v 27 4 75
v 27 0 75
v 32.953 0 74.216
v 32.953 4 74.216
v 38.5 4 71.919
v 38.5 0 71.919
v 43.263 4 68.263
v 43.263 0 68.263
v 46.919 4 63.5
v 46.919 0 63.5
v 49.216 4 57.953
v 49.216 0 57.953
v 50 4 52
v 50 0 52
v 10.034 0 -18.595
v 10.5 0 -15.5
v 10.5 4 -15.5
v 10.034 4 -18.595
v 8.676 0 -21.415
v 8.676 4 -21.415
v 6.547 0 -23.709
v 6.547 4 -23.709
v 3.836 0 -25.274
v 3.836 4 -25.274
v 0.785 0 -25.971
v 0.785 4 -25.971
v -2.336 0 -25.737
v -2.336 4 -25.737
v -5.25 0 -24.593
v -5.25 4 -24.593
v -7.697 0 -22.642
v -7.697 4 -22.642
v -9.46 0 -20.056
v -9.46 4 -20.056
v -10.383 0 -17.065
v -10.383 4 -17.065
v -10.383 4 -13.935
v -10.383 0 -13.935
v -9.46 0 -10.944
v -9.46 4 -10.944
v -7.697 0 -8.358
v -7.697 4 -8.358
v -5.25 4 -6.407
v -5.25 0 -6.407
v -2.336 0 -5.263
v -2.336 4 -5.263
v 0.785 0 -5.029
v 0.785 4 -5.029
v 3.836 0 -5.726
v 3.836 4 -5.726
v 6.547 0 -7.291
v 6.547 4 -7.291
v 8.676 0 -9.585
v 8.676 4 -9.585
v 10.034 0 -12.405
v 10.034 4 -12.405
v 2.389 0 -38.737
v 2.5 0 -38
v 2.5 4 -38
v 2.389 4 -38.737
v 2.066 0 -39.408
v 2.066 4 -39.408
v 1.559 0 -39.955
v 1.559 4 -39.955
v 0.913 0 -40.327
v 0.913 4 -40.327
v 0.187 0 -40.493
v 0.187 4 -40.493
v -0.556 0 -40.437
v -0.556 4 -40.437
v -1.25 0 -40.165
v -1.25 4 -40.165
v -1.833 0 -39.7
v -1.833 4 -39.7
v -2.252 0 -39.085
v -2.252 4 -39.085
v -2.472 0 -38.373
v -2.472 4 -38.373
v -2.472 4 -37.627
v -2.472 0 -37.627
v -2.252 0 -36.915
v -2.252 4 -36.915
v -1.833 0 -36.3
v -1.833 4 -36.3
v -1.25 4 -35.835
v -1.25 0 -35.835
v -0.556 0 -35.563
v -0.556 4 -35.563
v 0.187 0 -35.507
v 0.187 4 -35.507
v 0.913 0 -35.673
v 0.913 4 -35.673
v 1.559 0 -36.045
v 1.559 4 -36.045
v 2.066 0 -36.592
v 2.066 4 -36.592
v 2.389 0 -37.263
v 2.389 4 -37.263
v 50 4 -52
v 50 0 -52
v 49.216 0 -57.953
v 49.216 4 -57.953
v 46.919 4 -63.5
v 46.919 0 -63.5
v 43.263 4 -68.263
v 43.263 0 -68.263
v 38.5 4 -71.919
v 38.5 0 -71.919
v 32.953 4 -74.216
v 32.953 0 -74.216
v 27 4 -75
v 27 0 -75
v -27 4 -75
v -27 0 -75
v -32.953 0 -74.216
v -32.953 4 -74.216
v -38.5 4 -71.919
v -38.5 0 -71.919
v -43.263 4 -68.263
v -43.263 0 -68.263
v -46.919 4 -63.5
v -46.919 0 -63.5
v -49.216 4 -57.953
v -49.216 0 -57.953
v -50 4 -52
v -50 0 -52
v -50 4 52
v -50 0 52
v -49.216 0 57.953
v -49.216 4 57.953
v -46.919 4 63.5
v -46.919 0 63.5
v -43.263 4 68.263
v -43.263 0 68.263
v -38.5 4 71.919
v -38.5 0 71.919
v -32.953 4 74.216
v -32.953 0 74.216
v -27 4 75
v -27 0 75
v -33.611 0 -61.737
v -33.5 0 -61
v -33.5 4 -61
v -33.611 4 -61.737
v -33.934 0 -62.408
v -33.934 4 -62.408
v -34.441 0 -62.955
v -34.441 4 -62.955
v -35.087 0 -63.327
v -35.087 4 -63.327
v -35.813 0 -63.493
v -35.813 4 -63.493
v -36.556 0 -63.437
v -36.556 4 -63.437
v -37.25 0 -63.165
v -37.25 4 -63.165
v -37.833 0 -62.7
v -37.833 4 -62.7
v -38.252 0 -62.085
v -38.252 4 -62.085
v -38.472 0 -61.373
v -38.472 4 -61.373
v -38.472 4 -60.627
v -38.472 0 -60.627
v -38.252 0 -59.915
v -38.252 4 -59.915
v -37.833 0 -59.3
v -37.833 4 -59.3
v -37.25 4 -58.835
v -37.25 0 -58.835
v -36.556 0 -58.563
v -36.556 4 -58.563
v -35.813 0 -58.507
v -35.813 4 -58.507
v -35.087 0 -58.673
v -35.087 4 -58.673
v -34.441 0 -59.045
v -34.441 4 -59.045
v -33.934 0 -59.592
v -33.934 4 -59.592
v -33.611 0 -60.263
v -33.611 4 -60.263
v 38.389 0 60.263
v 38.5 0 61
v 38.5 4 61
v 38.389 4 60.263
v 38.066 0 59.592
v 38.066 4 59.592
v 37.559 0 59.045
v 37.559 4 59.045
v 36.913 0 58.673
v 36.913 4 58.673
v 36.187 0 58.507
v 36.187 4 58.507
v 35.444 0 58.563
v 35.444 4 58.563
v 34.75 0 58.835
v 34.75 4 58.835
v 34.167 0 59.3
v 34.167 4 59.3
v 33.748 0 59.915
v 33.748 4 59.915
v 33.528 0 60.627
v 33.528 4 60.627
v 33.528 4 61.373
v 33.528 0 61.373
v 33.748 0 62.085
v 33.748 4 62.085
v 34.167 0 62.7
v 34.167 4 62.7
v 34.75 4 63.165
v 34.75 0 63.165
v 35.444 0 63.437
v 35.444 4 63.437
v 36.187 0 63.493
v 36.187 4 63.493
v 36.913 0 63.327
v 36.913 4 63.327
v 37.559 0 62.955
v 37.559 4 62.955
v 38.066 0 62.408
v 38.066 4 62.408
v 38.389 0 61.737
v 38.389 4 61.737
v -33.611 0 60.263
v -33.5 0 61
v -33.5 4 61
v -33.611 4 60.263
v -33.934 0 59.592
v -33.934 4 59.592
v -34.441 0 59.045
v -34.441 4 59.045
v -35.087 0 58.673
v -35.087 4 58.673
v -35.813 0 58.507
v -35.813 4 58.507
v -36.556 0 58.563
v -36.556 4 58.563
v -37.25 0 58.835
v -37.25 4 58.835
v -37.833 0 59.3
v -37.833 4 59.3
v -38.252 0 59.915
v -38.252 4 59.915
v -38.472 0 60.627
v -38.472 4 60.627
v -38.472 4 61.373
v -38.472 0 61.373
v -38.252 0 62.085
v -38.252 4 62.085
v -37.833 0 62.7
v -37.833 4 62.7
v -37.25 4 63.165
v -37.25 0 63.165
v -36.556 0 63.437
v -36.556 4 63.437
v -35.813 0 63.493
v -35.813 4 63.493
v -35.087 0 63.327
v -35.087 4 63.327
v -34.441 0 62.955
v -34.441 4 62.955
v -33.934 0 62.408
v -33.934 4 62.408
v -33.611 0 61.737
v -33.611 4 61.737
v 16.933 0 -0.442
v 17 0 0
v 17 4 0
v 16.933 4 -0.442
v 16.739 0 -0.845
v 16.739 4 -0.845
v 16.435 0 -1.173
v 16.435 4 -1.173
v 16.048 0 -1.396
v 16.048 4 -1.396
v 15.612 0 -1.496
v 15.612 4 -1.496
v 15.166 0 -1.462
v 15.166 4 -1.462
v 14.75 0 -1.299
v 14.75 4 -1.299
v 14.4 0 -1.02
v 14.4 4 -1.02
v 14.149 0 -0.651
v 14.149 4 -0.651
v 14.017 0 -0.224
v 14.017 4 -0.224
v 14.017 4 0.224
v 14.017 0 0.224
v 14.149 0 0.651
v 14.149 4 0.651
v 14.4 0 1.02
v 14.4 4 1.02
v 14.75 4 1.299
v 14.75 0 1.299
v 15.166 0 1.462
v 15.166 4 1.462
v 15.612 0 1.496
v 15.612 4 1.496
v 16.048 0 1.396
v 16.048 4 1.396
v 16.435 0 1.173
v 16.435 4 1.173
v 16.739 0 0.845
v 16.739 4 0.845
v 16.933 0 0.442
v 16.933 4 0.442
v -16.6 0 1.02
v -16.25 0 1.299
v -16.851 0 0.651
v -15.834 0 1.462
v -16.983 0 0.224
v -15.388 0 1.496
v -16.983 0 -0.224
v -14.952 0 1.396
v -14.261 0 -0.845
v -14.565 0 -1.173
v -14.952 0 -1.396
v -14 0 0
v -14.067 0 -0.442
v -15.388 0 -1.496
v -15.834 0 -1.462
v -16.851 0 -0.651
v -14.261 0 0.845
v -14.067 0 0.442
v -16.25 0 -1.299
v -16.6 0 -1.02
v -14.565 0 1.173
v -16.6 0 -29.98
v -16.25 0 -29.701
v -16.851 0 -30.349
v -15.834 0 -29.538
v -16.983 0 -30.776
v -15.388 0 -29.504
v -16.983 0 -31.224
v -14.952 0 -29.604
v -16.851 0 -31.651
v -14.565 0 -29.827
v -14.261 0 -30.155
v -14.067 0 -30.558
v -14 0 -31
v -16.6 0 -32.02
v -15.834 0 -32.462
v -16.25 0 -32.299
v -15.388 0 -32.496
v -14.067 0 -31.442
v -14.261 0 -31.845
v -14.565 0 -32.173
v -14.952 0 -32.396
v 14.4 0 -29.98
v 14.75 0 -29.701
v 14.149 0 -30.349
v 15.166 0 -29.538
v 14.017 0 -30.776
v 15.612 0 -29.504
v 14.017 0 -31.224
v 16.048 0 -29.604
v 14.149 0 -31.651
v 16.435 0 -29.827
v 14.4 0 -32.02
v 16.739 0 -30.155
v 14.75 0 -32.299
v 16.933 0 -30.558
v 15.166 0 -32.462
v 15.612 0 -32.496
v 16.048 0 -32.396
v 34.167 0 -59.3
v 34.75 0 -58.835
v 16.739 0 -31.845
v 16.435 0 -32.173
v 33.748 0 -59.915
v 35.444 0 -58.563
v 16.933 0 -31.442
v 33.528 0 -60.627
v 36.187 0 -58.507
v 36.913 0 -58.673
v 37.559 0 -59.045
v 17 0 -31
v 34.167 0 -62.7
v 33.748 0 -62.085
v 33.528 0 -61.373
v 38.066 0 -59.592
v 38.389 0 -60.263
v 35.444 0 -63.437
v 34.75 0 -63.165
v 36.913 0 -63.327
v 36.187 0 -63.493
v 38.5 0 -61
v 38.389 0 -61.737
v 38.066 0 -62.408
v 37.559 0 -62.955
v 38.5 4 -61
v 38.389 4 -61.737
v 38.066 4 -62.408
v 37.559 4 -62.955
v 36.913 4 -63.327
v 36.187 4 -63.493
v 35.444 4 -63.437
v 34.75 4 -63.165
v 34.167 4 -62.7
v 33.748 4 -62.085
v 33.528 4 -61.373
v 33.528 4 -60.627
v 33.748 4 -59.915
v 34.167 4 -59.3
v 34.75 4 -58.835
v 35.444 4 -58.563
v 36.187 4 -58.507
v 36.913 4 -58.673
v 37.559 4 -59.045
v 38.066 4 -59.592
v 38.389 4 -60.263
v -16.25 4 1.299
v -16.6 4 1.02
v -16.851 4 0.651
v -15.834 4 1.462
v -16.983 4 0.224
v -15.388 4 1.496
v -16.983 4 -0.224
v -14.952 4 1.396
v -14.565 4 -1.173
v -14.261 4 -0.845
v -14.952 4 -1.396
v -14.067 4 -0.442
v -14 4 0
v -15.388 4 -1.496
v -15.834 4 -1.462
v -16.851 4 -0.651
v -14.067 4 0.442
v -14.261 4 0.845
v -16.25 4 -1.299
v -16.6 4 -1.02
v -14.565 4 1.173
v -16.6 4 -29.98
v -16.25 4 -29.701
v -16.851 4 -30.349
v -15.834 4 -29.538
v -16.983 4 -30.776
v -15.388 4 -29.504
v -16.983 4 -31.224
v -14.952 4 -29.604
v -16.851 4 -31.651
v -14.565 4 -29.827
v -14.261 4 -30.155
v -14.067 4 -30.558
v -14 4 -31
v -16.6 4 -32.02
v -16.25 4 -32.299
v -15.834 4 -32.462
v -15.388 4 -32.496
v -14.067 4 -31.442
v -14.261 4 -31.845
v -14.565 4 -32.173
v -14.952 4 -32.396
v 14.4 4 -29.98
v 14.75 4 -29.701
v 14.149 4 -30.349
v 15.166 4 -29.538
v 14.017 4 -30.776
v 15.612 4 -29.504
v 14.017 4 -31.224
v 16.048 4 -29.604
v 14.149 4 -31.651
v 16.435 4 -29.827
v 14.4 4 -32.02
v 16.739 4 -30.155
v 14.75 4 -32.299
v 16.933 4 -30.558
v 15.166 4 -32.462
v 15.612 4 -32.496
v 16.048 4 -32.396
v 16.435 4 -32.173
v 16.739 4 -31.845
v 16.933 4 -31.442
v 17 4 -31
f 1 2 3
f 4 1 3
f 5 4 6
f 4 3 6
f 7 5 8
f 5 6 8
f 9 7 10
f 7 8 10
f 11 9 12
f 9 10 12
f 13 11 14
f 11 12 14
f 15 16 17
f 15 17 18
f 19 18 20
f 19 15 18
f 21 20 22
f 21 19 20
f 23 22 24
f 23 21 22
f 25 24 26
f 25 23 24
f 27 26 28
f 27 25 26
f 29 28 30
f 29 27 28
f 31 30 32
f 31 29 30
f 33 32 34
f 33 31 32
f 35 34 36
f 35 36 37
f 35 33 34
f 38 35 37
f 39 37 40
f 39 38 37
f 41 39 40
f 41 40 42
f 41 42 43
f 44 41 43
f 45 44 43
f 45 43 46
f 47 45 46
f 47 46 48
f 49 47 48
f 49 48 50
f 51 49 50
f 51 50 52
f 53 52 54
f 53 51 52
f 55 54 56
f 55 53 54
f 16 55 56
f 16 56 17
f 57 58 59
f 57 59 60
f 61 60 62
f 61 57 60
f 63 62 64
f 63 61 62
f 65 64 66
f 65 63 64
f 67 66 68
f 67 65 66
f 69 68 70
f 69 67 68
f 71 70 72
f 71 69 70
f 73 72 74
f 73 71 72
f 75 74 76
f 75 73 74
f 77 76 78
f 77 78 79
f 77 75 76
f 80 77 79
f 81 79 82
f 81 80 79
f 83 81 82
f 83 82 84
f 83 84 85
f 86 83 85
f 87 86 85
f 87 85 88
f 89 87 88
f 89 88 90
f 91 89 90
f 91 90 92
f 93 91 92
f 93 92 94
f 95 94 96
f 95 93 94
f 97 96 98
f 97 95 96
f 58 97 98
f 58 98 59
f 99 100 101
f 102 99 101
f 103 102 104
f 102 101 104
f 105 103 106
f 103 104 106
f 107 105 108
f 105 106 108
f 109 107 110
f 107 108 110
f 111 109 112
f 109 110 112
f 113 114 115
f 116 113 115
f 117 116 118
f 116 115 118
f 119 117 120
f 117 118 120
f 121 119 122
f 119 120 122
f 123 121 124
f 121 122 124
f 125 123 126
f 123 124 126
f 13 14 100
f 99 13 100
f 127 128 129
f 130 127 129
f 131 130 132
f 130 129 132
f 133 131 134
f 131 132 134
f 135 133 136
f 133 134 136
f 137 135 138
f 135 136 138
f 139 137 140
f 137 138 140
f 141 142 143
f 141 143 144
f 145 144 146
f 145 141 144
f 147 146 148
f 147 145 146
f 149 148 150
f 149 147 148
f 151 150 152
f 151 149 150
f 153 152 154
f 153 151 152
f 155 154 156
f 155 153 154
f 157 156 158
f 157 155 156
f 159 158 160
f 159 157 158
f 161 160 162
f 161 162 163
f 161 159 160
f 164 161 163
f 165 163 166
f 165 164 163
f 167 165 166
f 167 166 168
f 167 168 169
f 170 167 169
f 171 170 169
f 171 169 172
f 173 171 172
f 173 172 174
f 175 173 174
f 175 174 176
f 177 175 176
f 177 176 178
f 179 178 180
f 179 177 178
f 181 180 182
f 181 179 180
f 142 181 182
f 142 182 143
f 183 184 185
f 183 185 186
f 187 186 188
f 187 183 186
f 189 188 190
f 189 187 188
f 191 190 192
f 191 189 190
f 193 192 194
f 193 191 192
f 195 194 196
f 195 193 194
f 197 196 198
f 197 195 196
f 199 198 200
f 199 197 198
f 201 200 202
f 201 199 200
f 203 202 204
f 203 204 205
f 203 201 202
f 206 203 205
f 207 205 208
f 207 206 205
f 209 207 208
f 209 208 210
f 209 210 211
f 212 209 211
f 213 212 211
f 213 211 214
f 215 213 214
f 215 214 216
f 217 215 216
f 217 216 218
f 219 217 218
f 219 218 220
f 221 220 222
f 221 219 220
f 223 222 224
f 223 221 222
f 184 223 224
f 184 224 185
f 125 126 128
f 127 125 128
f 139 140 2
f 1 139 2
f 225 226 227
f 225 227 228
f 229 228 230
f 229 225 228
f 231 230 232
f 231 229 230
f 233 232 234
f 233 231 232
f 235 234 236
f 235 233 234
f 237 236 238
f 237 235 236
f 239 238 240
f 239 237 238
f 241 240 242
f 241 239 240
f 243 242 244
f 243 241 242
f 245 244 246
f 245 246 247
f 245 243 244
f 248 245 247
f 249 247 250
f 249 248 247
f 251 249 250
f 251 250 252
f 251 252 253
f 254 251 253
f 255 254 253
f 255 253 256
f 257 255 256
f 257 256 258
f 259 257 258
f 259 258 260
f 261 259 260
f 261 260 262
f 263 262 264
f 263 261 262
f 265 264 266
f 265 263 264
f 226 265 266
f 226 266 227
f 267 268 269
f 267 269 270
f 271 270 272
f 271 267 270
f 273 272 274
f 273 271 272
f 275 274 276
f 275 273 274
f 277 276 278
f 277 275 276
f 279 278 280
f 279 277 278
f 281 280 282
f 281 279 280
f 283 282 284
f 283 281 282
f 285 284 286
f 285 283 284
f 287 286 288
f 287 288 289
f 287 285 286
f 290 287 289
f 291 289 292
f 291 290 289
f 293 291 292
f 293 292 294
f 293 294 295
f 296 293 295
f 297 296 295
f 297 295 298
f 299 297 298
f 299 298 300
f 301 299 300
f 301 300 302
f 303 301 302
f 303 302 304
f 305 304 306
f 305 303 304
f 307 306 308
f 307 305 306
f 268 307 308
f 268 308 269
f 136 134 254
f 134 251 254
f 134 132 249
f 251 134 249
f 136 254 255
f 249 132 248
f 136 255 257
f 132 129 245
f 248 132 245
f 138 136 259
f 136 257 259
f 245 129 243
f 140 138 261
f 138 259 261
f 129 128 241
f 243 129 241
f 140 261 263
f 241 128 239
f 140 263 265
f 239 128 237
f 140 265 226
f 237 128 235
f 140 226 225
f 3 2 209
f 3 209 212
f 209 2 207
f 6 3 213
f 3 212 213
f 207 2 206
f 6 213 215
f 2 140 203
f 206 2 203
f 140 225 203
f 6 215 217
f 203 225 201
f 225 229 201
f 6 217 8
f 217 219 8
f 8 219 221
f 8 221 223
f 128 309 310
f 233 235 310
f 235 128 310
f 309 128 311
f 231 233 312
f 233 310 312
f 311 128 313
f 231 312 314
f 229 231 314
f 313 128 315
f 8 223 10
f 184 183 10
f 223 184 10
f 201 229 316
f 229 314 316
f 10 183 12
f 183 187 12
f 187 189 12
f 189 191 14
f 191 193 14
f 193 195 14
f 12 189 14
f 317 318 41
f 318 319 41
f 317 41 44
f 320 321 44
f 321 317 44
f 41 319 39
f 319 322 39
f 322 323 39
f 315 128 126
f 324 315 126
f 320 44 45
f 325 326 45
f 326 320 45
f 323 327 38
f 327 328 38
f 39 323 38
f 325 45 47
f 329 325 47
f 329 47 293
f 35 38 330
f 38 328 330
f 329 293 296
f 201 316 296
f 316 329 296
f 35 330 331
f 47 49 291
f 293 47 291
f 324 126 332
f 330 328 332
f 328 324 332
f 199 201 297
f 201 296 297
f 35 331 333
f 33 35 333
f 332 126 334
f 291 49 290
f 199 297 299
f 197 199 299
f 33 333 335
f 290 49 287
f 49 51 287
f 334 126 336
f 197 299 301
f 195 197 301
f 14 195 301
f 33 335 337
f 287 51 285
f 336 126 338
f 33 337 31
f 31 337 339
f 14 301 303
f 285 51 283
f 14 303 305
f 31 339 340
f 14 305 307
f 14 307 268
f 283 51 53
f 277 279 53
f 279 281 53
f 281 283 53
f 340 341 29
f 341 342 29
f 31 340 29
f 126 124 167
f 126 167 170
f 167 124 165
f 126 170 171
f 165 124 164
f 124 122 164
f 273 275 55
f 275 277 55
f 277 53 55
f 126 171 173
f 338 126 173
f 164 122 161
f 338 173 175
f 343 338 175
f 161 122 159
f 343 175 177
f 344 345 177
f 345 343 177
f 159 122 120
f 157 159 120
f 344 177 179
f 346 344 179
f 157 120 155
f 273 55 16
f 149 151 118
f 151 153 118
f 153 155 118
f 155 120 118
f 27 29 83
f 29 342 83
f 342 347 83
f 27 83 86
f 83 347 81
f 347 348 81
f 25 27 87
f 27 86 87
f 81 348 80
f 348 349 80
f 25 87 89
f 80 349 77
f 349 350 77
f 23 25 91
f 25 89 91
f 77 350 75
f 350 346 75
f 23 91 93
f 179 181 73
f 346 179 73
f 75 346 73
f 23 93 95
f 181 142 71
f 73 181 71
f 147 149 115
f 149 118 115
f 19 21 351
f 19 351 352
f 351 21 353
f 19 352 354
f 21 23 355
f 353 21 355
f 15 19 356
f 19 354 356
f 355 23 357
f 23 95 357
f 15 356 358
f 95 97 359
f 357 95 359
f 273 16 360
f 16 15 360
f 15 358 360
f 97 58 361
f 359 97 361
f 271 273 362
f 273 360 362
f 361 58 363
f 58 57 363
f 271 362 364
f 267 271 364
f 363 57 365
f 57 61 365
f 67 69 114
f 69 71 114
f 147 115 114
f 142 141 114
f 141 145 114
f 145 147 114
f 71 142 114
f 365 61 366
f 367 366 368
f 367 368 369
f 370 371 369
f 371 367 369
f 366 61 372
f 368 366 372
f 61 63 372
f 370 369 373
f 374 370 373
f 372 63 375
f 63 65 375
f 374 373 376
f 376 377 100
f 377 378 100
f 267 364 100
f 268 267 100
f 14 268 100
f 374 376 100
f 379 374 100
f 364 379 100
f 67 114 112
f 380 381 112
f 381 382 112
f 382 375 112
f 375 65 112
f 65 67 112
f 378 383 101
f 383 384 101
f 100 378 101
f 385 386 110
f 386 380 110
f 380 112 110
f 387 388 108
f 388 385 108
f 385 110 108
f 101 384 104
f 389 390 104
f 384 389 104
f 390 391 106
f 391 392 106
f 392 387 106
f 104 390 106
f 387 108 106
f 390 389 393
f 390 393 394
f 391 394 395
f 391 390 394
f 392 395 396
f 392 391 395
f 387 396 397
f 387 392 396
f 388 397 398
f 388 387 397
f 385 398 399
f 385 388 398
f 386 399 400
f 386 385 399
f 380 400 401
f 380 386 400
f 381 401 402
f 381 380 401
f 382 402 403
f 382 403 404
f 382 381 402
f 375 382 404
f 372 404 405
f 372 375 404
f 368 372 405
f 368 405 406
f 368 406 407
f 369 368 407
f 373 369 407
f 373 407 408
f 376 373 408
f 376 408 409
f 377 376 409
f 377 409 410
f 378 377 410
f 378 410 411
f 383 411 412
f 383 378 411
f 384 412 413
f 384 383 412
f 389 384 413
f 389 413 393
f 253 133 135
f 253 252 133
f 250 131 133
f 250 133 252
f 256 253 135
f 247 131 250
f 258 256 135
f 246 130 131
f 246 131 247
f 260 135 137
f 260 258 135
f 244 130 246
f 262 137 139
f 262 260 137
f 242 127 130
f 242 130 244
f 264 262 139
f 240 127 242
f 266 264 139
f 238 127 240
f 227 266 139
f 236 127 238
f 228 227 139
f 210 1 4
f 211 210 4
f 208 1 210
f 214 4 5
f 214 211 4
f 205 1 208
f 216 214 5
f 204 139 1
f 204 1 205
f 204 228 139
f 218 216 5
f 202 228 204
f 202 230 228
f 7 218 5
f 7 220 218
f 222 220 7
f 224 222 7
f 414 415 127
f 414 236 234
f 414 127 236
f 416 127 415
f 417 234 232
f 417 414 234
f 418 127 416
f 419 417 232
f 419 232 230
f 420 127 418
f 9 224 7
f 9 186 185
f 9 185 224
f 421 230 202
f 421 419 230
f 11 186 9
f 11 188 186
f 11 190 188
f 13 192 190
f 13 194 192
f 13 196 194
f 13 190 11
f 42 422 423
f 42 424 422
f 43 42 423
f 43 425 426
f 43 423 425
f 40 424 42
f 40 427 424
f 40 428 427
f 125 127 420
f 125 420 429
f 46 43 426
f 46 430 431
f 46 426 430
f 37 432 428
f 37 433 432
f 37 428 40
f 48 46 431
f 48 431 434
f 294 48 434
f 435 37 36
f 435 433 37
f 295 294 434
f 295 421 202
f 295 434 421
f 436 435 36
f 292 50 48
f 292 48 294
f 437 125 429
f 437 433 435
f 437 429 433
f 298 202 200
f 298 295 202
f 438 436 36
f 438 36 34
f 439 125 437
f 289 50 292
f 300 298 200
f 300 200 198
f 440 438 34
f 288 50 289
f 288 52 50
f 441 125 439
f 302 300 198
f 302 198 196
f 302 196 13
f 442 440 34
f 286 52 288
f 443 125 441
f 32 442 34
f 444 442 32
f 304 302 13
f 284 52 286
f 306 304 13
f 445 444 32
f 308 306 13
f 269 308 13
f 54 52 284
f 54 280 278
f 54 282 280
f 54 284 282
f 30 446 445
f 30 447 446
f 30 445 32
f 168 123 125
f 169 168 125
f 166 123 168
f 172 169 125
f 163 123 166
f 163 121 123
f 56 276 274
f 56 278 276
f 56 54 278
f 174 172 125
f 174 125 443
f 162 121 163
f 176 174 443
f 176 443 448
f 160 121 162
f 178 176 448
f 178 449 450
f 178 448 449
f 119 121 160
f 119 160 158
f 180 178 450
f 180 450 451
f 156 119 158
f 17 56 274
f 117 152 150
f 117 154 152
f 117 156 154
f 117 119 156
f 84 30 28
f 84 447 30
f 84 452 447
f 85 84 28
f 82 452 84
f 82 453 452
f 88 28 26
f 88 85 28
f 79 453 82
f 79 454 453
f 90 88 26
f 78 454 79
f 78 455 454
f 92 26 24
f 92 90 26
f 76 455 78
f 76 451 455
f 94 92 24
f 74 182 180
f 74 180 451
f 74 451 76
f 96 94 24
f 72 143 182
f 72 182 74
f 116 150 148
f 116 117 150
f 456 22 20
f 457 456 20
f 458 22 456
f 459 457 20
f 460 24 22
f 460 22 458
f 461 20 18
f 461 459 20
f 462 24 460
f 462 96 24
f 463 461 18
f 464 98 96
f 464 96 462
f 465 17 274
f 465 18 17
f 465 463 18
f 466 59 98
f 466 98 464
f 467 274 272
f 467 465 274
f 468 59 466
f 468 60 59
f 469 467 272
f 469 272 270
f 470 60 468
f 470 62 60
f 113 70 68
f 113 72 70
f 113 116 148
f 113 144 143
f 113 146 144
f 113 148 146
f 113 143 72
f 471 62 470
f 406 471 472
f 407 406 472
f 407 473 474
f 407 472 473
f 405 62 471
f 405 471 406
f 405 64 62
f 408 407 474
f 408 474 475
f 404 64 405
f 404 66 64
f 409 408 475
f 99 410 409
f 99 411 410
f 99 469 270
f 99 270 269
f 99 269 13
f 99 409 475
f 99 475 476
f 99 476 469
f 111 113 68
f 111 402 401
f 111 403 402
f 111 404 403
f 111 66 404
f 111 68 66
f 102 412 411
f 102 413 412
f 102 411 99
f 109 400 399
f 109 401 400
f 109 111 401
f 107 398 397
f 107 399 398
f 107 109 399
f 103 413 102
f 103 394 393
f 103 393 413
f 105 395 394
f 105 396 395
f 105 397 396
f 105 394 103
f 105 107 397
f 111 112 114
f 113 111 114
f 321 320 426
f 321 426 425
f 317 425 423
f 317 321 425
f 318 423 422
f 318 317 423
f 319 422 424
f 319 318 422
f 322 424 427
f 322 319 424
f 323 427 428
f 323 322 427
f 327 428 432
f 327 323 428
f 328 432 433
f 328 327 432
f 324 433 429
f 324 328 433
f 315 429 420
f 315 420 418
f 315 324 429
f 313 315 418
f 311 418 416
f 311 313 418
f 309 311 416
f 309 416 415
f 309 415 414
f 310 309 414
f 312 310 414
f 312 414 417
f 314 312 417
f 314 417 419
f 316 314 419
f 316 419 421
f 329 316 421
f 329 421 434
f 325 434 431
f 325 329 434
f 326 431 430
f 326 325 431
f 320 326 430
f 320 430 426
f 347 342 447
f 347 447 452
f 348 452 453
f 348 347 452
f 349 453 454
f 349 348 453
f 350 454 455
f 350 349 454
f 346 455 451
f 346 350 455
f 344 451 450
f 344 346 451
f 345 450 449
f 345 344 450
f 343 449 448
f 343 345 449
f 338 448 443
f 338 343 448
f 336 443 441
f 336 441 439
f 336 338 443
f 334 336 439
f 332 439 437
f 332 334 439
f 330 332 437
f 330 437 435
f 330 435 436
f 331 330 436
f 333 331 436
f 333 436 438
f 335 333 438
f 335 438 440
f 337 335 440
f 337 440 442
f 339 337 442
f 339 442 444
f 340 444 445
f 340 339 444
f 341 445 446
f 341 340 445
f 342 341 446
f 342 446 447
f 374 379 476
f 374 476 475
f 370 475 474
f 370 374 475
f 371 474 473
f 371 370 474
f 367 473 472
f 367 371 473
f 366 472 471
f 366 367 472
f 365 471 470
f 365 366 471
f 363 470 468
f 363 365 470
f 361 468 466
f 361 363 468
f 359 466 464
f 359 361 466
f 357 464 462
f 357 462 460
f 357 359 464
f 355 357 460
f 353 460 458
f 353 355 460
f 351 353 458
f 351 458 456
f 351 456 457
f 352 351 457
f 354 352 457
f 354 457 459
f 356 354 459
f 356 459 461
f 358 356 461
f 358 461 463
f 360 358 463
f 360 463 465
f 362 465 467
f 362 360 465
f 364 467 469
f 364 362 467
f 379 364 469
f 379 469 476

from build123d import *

# Parameters (mm, degrees)
SKETCH1_R           = 2.5
SKETCH1_R_2         = 10.5
SKETCH1_R_3         = 1.5
BOSS_EXTRUDE1_DEPTH = 4


with BuildPart() as part:
    # Sketch1 → Boss-Extrude1 (new body)
    with BuildSketch(Plane(origin=(0, 0, 0), x_dir=(1, 0, 0), z_dir=(0, 1, 0))):
        with BuildLine():
            Line((-27, -75), (27, -75))
            ThreePointArc((27, -75), (43.263455967, -68.263455967), (50, -52))
            Line((50, -52), (50, 52))
            ThreePointArc((50, 52), (43.263455967, 68.263455967), (27, 75))
            Line((27, 75), (-27, 75))
            ThreePointArc((-27, 75), (-43.263455967, 68.263455967), (-50, 52))
            Line((-50, 52), (-50, -52))
            ThreePointArc((-50, -52), (-43.263455967, -68.263455967), (-27, -75))
        make_face()
        with Locations((-36, 61)):
            Circle(SKETCH1_R, mode=Mode.SUBTRACT)
        with Locations((-36, -61)):
            Circle(SKETCH1_R, mode=Mode.SUBTRACT)
        with Locations((36, -61)):
            Circle(SKETCH1_R, mode=Mode.SUBTRACT)
        with Locations((36, 61)):
            Circle(SKETCH1_R, mode=Mode.SUBTRACT)
        with Locations((0, 38)):
            Circle(SKETCH1_R, mode=Mode.SUBTRACT)
        with Locations((0, 15.5)):
            Circle(SKETCH1_R_2, mode=Mode.SUBTRACT)
        with Locations((15.5, 31)):
            Circle(SKETCH1_R_3, mode=Mode.SUBTRACT)
        with Locations((-15.5, 31)):
            Circle(SKETCH1_R_3, mode=Mode.SUBTRACT)
        with Locations((-15.5, 0)):
            Circle(SKETCH1_R_3, mode=Mode.SUBTRACT)
        with Locations((15.5, 0)):
            Circle(SKETCH1_R_3, mode=Mode.SUBTRACT)
    extrude(amount=BOSS_EXTRUDE1_DEPTH)


solid = part.part
